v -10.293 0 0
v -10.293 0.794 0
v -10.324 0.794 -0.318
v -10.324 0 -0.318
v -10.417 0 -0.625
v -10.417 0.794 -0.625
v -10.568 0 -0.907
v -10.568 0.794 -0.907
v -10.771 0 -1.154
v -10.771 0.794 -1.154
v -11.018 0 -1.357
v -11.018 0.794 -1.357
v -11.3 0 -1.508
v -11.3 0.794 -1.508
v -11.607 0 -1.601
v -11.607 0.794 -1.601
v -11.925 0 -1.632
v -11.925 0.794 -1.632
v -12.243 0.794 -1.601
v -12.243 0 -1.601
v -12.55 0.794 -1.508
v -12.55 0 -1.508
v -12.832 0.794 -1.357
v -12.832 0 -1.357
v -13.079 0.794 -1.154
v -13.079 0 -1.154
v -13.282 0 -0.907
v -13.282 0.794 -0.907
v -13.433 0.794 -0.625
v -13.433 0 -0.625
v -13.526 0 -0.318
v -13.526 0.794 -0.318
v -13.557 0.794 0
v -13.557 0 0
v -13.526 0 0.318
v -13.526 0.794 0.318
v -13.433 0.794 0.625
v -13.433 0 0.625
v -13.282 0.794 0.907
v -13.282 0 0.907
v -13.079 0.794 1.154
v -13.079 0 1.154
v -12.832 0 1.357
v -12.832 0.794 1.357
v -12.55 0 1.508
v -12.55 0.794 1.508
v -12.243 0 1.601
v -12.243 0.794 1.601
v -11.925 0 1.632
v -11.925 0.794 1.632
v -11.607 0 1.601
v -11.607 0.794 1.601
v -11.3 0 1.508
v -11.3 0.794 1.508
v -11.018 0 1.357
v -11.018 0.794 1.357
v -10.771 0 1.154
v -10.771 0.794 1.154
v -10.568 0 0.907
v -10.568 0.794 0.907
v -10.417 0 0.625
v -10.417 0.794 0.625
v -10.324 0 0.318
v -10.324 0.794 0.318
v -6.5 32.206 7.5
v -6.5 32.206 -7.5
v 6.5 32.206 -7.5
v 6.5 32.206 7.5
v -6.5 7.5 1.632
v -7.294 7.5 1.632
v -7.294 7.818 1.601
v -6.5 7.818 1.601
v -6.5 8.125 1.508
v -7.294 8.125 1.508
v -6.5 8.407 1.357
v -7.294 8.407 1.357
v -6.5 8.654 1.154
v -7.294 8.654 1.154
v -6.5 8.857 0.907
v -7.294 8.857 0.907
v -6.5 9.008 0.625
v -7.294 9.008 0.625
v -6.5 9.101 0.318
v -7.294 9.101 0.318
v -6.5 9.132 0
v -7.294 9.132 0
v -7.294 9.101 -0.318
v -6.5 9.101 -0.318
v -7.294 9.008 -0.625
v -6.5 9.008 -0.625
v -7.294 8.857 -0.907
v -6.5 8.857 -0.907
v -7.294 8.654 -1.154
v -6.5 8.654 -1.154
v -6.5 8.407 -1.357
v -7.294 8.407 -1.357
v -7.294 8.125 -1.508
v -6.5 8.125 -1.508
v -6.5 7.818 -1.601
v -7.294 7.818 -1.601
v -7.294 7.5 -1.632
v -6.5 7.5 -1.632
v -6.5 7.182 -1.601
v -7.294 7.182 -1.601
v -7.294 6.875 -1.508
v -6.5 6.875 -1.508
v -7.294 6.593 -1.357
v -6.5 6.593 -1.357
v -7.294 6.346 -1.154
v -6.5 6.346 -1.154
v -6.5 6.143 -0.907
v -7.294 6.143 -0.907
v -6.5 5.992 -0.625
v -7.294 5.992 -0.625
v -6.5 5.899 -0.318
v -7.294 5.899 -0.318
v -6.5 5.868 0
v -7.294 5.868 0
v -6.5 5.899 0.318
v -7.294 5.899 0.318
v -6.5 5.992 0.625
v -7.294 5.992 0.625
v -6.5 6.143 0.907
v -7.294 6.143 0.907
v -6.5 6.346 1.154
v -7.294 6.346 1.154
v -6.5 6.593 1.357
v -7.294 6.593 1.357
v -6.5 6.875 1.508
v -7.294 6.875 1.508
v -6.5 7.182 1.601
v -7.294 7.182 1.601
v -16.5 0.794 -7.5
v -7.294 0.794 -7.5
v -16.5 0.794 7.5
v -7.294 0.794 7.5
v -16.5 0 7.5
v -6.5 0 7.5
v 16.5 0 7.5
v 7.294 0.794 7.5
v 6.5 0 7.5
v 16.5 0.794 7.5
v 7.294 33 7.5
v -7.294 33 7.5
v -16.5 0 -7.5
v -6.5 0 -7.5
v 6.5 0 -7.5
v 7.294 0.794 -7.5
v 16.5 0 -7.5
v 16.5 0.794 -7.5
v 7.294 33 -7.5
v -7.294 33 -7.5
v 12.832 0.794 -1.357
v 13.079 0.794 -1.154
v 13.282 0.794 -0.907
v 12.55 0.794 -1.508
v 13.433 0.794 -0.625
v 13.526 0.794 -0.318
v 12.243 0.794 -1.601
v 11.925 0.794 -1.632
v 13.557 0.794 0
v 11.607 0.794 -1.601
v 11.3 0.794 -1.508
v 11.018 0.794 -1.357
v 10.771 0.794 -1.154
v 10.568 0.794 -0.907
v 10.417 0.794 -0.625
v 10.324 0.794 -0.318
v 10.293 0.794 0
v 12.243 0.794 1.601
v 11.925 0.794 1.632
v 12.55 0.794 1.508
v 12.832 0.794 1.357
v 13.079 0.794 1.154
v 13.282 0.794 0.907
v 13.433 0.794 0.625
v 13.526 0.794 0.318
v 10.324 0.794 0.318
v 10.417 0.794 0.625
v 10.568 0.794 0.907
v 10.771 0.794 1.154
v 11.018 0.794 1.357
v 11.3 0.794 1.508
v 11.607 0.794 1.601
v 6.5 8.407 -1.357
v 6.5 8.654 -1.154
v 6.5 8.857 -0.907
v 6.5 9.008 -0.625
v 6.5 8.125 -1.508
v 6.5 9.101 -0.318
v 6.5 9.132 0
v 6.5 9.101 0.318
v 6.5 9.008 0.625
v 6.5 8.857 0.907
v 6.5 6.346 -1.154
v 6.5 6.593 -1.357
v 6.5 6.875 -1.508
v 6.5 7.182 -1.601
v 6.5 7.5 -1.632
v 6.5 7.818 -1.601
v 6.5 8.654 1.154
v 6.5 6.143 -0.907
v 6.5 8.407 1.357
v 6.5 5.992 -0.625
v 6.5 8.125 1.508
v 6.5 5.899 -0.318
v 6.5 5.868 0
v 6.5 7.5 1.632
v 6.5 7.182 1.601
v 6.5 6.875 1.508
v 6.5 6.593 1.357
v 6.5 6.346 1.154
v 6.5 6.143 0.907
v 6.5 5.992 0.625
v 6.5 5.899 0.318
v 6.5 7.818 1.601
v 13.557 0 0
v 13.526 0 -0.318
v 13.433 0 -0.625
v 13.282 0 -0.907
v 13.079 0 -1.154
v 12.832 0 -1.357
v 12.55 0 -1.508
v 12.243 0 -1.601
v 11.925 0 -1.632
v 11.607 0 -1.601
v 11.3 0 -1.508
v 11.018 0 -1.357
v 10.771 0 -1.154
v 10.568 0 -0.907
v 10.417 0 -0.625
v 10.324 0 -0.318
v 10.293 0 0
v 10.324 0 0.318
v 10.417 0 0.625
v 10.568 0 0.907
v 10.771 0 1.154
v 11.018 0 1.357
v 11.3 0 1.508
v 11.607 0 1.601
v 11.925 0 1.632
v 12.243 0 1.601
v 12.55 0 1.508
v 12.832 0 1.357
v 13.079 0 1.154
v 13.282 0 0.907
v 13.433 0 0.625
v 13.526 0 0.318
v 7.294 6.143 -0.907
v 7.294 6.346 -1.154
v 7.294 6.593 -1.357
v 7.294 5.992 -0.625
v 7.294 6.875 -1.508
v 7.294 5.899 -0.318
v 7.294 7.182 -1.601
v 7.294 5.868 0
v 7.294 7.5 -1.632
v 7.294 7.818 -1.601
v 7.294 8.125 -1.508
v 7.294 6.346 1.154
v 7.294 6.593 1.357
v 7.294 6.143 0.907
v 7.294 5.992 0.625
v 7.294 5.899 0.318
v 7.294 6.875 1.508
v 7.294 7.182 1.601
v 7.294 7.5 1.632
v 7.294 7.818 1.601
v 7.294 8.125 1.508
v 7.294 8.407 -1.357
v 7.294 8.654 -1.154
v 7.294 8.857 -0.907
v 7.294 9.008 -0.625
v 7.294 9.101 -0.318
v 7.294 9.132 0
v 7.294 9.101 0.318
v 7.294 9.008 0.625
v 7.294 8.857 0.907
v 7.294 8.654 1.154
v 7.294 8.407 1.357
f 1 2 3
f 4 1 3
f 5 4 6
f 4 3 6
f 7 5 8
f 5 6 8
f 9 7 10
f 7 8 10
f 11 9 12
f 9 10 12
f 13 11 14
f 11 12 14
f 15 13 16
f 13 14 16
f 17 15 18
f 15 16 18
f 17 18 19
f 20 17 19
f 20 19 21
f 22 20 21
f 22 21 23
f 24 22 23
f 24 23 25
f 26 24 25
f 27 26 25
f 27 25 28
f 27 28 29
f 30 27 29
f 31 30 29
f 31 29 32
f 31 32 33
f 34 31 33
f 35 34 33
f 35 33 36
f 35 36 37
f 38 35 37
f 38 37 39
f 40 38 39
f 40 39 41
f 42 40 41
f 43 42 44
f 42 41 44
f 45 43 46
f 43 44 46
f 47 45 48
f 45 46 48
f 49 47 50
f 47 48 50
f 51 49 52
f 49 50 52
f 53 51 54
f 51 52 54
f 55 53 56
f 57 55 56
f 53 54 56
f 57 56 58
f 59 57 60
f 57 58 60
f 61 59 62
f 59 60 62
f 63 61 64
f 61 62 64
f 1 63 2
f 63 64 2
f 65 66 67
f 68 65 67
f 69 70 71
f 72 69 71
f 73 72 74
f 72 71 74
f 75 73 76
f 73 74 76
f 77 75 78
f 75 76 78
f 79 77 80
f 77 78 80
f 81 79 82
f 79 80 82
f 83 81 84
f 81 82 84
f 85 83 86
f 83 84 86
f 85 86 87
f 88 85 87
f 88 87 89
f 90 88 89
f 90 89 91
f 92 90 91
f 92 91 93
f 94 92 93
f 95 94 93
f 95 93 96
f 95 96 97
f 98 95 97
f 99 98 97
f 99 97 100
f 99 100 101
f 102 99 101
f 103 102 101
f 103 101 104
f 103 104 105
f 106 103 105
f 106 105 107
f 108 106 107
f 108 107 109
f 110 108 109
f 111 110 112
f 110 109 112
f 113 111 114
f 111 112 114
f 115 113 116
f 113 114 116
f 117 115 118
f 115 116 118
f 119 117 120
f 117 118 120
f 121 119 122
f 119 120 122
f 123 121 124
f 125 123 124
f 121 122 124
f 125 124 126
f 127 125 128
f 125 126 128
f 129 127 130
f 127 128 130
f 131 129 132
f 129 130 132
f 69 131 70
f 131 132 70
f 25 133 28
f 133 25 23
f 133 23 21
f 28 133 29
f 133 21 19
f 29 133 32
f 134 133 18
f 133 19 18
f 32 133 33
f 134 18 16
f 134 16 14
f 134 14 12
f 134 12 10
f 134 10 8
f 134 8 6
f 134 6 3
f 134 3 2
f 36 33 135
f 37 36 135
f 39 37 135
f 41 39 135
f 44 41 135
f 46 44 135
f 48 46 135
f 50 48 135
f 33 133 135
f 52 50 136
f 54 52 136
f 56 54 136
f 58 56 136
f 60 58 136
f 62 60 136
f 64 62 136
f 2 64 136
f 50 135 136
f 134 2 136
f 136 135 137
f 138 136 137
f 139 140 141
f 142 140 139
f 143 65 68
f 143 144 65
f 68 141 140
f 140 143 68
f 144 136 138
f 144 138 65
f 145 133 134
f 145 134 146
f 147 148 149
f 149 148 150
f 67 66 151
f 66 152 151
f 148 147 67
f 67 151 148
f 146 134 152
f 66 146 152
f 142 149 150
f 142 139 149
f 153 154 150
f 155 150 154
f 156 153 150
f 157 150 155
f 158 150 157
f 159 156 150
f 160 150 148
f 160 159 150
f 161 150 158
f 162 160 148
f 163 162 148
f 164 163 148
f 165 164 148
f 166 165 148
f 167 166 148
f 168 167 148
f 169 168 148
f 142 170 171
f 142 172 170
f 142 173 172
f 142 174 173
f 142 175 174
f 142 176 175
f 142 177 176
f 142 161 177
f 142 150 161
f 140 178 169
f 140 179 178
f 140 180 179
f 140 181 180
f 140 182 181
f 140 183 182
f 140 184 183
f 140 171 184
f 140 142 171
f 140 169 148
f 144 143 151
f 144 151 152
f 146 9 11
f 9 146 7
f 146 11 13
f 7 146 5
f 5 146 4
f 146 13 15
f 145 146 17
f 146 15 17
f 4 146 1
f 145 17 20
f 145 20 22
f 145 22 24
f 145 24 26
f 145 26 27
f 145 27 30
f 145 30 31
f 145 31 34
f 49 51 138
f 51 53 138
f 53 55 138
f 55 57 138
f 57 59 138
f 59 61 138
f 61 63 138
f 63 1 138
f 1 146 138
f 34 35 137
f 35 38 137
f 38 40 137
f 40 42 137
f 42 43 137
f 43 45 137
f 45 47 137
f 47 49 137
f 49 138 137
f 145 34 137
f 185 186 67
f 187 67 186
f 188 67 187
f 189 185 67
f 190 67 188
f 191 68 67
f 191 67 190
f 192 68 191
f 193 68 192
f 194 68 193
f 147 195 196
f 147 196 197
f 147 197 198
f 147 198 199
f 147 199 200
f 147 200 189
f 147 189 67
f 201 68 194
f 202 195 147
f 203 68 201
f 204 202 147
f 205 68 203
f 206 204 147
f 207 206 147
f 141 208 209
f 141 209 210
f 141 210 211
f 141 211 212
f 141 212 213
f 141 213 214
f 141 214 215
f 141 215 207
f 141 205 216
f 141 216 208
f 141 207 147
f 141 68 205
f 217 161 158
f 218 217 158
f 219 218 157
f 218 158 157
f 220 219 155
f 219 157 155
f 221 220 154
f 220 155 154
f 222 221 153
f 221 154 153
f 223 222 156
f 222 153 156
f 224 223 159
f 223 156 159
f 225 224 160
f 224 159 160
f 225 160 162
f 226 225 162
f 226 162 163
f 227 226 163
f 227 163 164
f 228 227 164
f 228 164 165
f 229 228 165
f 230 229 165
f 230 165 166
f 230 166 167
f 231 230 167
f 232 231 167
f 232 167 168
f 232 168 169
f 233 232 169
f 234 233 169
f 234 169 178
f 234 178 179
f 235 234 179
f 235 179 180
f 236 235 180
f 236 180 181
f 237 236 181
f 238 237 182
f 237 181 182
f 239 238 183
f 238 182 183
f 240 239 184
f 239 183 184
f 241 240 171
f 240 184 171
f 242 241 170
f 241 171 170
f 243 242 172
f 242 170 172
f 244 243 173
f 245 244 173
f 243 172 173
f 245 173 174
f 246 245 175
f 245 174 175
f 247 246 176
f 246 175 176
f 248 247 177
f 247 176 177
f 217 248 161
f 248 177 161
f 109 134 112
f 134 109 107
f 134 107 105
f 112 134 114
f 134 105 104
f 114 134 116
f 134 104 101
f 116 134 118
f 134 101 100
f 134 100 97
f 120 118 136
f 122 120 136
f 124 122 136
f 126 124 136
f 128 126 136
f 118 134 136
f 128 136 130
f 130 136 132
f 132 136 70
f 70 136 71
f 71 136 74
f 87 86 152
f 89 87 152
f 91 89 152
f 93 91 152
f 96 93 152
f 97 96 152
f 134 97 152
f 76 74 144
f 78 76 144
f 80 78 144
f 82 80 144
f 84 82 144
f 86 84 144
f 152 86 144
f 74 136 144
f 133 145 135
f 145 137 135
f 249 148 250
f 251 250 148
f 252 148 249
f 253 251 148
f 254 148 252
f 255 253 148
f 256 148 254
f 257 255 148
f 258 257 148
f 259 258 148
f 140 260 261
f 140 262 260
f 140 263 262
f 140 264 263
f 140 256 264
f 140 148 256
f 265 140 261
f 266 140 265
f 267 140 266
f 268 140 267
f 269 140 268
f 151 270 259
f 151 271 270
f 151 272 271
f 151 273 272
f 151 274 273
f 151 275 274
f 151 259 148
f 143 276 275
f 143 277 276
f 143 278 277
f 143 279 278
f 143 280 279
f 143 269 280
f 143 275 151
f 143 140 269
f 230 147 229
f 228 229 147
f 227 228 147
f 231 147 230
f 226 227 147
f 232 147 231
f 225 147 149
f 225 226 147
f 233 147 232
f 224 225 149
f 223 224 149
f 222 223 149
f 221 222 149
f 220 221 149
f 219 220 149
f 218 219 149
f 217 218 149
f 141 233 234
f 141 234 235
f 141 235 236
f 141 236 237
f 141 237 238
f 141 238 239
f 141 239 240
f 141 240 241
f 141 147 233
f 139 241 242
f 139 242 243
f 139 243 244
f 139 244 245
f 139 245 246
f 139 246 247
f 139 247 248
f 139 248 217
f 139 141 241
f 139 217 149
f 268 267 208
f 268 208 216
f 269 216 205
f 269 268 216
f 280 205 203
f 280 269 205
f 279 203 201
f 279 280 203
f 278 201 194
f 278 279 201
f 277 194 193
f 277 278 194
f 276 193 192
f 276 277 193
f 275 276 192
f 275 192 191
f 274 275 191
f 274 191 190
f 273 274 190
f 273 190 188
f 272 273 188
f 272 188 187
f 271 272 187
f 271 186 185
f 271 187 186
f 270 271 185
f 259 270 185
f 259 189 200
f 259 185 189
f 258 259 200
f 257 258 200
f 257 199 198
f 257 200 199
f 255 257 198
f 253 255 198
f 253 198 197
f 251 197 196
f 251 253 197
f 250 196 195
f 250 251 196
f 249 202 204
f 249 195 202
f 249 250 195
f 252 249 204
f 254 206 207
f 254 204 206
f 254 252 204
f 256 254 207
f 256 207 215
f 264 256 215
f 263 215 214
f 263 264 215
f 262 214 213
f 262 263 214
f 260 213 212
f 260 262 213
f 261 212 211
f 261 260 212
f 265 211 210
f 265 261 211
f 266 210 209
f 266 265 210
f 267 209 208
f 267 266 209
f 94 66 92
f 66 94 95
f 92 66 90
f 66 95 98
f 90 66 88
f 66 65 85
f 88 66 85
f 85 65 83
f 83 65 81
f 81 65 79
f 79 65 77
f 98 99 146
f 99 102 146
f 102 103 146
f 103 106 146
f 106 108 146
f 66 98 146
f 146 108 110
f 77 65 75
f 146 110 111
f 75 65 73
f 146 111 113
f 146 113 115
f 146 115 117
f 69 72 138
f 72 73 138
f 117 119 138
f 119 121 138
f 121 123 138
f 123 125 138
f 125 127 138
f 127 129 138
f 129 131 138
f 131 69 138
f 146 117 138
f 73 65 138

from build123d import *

# Parameters (mm, degrees)
BOSS_EXTRUDE1_DEPTH   = 7.5
F_4_CLEARANCE_HOLE1_D = 3.2639
F_4_CLEARANCE_HOLE2_D = 3.2639


with BuildPart() as part:
    # Sketch1 → Boss-Extrude1 (new, symmetric)
    with BuildSketch(Plane.XY):
        Polygon((0, 32.20625), (-6.5, 32.20625), (-6.5, 0), (-16.5, 0), (-16.5, 0.79375), (-7.29375, 0.79375), (-7.29375, 33), (0, 33), align=None)
    boss_extrude1 = extrude(amount=BOSS_EXTRUDE1_DEPTH, both=True)

    # #4 Clearance Hole1 (through all)
    with Locations(Plane(origin=(-6.5, 0, 0), x_dir=(0, 0, -1), z_dir=(1, 0, 0))):
        with Locations((0, 7.5)):
            f_4_clearance_hole1 = Hole(F_4_CLEARANCE_HOLE1_D / 2)

    # Mirror1: Boss-Extrude1, #4 Clearance Hole1 across plane
    add(boss_extrude1.mirror(Plane(origin=(0, 0, 0), x_dir=(0, 0, 1), z_dir=(1, 0, 0))))
    add(f_4_clearance_hole1.mirror(Plane(origin=(0, 0, 0), x_dir=(0, 0, 1), z_dir=(1, 0, 0))), mode=Mode.SUBTRACT)

    # #4 Clearance Hole2 (through all)
    with Locations(Plane(origin=(0, 0, 0), x_dir=(-1, 0, 0), z_dir=(0, -1, 0))):
        with Locations((11.925, 0), (-11.925, 0)):
            Hole(F_4_CLEARANCE_HOLE2_D / 2)


solid = part.part
